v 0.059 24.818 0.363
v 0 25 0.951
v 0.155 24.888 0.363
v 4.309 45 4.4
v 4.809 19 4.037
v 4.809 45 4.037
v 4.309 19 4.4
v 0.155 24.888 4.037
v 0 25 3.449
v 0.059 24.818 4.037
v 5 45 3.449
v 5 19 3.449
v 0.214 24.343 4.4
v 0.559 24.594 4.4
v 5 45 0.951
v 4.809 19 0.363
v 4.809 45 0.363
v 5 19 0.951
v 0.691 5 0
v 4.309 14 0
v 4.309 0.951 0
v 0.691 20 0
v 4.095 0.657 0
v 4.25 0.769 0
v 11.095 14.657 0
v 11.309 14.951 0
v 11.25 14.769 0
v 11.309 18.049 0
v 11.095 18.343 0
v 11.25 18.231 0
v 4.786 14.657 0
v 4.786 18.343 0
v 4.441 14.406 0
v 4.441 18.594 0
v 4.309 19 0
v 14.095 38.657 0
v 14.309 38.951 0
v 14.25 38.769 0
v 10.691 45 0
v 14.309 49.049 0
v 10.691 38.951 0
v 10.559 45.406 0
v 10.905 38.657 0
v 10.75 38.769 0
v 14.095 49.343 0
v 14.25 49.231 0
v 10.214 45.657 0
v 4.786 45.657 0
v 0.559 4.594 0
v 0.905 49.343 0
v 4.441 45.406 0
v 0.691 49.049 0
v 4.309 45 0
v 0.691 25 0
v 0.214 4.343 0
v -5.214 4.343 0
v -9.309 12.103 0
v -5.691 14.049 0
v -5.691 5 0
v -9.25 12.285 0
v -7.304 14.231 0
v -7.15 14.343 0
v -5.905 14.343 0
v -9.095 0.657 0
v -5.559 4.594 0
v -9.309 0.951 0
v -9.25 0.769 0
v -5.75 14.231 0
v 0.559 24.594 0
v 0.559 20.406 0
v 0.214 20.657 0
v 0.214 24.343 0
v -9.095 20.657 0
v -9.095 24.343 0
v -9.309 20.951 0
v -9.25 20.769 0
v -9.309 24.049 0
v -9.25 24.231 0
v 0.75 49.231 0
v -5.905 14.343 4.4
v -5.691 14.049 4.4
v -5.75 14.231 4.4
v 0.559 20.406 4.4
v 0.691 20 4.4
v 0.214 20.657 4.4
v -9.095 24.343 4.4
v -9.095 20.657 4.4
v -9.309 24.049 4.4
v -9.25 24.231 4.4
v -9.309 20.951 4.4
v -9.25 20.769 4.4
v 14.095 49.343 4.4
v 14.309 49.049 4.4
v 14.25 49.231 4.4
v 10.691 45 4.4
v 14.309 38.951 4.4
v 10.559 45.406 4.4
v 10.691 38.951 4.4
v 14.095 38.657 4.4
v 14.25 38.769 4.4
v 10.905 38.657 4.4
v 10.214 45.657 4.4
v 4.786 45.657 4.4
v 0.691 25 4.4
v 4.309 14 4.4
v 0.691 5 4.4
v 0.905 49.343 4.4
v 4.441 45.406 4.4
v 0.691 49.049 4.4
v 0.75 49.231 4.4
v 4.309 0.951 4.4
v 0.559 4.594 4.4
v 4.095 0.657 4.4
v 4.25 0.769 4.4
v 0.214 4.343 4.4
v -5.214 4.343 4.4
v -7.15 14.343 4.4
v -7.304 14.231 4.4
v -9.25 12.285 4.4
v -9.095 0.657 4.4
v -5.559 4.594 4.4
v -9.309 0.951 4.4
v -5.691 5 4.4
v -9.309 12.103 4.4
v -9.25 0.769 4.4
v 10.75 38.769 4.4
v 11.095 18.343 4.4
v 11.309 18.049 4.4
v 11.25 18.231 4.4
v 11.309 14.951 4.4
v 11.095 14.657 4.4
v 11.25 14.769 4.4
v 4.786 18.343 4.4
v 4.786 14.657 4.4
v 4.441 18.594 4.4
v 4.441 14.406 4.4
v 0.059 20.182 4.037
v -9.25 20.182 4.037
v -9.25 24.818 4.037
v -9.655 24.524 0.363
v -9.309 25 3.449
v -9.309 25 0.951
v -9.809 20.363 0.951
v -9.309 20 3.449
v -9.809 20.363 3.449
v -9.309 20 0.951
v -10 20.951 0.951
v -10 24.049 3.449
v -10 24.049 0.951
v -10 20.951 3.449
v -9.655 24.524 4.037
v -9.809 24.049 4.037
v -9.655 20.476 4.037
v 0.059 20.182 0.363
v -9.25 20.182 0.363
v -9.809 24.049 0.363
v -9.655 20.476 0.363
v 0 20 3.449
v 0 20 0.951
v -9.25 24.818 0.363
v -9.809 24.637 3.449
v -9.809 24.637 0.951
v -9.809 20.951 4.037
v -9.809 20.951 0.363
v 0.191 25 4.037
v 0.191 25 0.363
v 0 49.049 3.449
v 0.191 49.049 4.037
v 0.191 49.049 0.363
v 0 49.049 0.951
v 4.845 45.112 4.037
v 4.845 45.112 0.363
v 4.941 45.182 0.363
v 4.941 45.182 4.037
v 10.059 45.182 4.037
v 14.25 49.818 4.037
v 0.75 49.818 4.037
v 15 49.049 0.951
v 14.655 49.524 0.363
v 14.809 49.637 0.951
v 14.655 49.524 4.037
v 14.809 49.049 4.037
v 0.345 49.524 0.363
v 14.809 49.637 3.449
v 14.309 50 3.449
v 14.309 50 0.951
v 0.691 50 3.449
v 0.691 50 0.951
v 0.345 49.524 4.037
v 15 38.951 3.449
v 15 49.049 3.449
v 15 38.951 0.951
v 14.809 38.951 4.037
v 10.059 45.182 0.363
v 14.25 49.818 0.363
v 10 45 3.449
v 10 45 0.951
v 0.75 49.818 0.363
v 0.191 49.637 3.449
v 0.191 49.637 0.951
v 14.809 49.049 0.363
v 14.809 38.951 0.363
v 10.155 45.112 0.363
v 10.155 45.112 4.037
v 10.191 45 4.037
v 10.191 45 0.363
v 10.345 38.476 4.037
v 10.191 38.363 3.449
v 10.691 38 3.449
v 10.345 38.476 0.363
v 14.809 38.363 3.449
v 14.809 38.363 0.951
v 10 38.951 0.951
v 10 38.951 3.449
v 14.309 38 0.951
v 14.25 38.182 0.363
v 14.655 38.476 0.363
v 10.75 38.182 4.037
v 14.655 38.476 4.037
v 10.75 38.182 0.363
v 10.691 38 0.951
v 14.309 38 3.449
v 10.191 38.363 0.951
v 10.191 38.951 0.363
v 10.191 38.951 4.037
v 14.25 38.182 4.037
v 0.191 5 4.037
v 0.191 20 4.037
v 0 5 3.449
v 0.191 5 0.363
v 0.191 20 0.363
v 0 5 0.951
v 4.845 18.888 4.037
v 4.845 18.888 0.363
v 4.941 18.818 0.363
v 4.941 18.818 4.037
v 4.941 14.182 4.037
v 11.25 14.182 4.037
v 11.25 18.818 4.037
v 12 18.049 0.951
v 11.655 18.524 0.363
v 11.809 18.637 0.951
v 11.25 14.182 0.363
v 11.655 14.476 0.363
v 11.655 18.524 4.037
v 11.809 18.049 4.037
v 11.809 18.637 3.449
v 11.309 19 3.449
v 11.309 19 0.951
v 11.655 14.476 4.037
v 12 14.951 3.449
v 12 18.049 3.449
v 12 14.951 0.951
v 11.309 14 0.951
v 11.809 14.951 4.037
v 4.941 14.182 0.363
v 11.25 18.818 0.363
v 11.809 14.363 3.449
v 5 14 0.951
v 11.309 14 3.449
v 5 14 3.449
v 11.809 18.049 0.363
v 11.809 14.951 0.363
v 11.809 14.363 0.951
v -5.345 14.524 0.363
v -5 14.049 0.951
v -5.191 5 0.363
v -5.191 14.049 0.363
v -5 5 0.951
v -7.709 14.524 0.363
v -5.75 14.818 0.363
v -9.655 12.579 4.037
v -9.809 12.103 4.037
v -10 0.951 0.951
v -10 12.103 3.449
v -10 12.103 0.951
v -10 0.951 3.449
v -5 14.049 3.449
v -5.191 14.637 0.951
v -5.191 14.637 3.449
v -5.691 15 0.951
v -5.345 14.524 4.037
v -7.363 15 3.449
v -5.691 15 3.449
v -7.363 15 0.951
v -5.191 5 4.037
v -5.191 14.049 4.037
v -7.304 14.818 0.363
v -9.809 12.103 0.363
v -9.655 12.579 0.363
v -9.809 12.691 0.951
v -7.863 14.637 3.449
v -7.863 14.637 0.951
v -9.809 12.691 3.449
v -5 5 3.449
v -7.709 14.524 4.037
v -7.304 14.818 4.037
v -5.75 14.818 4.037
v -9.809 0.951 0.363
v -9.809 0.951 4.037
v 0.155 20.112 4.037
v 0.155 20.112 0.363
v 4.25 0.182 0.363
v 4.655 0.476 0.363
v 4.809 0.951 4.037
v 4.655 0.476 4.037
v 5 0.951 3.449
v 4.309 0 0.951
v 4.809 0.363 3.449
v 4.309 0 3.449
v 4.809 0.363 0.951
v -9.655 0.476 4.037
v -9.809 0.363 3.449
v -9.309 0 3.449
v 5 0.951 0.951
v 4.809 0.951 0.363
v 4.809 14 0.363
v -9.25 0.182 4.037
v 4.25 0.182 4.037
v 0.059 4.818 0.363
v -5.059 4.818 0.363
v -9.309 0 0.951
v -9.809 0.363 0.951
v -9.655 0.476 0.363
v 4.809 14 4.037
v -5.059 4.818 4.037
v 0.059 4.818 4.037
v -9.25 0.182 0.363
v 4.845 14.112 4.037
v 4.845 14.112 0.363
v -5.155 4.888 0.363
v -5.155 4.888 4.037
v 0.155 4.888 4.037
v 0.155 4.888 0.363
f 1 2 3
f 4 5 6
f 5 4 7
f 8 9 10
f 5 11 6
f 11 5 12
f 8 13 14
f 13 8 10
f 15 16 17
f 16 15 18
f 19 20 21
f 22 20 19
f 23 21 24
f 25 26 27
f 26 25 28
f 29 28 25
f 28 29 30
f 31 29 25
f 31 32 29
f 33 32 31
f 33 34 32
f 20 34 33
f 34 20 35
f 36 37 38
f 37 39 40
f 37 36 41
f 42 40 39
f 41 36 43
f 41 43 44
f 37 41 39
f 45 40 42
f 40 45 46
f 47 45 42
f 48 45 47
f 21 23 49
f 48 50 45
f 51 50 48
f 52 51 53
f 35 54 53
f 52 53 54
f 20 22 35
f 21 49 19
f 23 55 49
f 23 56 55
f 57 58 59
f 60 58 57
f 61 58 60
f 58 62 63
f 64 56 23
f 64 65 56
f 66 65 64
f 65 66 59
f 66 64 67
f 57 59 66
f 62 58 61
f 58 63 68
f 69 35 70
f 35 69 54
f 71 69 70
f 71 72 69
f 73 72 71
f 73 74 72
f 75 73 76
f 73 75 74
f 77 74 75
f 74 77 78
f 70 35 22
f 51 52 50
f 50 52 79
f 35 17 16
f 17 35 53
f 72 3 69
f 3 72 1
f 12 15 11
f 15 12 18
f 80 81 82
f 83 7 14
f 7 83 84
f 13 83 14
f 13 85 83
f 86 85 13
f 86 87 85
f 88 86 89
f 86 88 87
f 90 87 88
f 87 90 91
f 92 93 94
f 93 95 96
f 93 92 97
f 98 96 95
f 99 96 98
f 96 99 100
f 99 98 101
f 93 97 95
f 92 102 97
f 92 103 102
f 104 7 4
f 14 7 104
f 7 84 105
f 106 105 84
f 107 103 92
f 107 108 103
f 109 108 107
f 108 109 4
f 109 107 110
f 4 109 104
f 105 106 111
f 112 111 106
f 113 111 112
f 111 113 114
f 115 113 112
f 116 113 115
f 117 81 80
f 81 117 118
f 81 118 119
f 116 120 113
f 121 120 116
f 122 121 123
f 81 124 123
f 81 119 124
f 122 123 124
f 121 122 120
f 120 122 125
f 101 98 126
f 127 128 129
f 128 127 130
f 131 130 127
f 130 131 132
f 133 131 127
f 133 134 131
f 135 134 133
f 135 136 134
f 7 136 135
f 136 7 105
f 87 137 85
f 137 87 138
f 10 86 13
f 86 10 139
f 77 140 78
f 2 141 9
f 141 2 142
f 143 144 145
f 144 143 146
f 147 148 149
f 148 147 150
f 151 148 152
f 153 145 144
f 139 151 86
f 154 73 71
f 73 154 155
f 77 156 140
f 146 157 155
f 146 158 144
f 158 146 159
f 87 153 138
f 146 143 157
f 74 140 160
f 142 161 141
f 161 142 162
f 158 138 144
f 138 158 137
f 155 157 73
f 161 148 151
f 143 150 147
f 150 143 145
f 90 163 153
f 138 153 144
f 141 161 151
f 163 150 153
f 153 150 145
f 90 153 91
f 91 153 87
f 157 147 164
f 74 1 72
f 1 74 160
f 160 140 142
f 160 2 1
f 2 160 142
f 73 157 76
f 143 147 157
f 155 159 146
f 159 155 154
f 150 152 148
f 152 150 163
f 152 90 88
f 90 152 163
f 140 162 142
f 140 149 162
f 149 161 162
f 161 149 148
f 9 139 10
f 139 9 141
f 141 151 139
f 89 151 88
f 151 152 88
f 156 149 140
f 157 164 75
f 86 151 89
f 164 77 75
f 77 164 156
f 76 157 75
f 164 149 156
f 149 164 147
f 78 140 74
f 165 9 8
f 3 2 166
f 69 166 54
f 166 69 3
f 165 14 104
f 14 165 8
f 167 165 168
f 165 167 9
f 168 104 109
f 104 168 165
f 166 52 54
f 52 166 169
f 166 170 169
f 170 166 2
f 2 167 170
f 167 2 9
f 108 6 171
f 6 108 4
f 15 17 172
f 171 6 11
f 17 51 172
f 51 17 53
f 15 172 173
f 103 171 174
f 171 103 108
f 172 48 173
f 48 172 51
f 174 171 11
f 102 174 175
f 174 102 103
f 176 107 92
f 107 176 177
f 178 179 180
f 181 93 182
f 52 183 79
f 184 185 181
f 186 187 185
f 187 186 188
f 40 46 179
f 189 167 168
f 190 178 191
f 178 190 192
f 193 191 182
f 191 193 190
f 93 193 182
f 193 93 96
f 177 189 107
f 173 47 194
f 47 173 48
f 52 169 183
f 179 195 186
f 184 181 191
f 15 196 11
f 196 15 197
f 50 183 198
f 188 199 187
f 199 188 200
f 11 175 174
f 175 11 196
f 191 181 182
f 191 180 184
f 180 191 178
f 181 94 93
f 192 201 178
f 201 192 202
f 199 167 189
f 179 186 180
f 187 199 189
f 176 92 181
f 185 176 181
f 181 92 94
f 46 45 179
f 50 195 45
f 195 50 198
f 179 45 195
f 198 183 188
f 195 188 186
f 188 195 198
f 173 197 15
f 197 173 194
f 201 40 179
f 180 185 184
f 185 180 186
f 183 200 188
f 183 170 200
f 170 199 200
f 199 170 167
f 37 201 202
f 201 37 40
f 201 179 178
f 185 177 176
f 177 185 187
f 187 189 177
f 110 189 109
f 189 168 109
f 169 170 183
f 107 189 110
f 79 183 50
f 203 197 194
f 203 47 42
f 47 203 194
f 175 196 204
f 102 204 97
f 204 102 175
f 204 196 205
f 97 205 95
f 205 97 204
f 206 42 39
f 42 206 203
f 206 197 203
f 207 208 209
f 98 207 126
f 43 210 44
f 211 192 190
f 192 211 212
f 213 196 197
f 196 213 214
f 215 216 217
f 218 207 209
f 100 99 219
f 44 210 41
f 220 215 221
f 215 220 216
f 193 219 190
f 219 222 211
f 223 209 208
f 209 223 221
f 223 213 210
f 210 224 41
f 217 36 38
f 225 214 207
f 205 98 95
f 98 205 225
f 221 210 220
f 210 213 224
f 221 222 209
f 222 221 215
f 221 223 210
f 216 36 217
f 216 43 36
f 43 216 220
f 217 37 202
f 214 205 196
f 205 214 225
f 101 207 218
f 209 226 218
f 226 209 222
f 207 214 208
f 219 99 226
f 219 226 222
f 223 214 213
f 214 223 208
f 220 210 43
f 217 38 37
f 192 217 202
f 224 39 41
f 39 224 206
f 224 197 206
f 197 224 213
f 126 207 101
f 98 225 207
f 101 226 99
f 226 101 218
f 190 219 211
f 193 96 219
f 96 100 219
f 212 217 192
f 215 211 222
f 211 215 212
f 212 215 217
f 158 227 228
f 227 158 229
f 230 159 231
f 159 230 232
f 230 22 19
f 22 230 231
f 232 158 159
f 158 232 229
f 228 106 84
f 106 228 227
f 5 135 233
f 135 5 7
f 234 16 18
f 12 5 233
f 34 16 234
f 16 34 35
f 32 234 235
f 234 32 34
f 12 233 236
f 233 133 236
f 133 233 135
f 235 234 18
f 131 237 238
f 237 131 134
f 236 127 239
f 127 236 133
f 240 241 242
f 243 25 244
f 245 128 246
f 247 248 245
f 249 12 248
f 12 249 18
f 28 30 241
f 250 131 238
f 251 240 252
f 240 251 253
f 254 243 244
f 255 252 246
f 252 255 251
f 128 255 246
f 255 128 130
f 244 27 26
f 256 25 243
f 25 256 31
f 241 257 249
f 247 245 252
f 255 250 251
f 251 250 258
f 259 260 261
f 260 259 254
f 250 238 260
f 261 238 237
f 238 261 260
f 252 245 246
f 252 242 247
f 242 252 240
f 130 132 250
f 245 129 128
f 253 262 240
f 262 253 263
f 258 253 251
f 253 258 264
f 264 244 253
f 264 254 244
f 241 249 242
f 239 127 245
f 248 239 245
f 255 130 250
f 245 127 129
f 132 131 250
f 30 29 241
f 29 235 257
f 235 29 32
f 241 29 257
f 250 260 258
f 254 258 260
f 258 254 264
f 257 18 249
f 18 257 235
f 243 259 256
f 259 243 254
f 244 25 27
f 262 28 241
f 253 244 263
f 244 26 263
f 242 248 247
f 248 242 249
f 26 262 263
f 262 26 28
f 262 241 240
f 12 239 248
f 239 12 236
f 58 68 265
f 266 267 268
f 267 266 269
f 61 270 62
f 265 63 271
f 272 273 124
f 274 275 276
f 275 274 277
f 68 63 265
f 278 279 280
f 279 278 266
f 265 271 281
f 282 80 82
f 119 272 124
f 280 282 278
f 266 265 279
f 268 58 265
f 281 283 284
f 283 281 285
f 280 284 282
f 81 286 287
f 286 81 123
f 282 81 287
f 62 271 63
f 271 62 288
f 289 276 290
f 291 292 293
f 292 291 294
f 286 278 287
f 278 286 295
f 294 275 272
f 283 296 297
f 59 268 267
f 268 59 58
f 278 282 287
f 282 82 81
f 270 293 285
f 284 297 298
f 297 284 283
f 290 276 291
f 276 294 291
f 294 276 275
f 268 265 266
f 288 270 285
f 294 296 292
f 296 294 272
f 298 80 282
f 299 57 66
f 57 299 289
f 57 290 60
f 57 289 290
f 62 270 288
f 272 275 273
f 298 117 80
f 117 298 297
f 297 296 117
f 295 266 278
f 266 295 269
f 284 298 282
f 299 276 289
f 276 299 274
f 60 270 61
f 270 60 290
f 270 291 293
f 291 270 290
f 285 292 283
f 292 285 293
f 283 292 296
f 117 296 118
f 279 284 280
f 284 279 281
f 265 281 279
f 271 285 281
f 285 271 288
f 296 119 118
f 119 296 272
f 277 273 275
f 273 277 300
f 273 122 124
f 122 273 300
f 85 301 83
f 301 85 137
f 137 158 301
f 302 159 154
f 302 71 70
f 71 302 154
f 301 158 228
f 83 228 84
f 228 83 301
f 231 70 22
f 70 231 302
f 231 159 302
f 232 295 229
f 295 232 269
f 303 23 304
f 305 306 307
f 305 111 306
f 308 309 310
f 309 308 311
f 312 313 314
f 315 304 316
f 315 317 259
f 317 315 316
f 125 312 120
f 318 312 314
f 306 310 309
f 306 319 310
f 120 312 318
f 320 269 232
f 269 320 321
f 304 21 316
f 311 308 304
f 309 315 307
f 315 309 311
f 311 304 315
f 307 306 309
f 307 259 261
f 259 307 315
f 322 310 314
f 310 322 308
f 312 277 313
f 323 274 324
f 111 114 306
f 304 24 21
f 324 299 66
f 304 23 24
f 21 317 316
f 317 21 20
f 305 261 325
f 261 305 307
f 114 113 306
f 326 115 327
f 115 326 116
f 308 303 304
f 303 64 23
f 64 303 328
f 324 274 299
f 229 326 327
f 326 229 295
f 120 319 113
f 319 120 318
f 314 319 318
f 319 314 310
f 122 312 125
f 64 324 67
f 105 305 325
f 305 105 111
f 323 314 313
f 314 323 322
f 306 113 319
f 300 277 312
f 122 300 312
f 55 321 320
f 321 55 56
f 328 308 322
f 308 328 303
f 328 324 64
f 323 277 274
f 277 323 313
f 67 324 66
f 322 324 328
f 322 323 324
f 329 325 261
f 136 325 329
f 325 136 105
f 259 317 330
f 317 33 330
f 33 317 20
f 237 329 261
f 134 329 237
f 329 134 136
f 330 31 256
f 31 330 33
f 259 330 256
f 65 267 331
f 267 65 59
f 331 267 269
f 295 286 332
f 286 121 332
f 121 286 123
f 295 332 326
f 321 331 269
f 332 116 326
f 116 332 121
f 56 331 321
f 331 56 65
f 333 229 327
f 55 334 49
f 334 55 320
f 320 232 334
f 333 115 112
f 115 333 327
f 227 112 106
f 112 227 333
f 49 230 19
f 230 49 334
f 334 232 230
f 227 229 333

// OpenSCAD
/* [Hidden] */
$fn = 10;

CLIP_HEIGHT = 12;
CLIP_PIN_INNER_DISTANCE = 26;
PIN_LENGTH = 7;

BASE_WIDTH = 4.4;
BASE_DEPTH = 5;

/* [Base] */
// Height of the base.
BASE_HEIGHT = 50; // [36:100]

/* [Hook] */
// Enable Smooth Edges.
ENABLE_SMOOTH_EDGES = true;
// Make the hook a bit prettier.
ENABLE_HOOK_NICE = true;
// Length (horizontal size) of the hook.
HOOK_SIZE_H = 15; // [1:100]
// Height (vertical size) of the hook.
HOOK_SIZE_V = 10; // [0:50]
// Vertical rotation of the hook.
HOOK_ROTATION = 0; // [0:90]


minkowskiOutsideRound(1, ENABLE_SMOOTH_EDGES) {
	hook(
		base_height = BASE_HEIGHT,
		base_width = BASE_WIDTH,
		base_depth = BASE_DEPTH,
		clip_height = CLIP_HEIGHT,
		clip_pin_distance = CLIP_PIN_INNER_DISTANCE,
		pin_length = PIN_LENGTH,
		hook_size_h = HOOK_SIZE_H,
		hook_size_v = HOOK_SIZE_V,
		hook_nice = ENABLE_HOOK_NICE,
		hook_rotation = HOOK_ROTATION
	);
}


module hook(
	base_height = 50,
	base_width = 4.4,
	base_depth = 5,
	clip_height = 12,
	clip_pin_distance = 19,
	pin_length = 7,
	hook_size_h = 15,
	hook_size_v = 5,
	hook_nice = true,
	hook_rotation = 0,
) {
	// Base
	cube(size=[base_depth, base_height, base_width]);

	// Clip, Top
	translate([base_depth, base_height-base_depth, 0]) {
		cube(size=[base_depth, base_depth, base_width]);
	}

	// Clip, Back
	translate([base_depth*2, base_height-clip_height, 0]) {
		cube(size=[base_depth, clip_height, base_width]);
	}

	// Pin
	translate([base_depth, base_height-2*base_depth-clip_pin_distance, 0]) {
		cube(size=[7, base_depth, base_width]);
	}

	// Hook, Horizontal
	translate([-(hook_size_h-base_depth), 0, 0]) {
		cube(size=[hook_size_h-base_depth, base_depth, base_width]);
	}
	
	// Adding new Hooks
	// Hook, Horizontal 2
	translate([-(hook_size_h-base_depth), 20, 0]) {
		cube(size=[hook_size_h-base_depth, base_depth, base_width]);
	}

	// Hook, Vertical
	if (hook_size_h > 0) {
		translate([-(hook_size_h-base_depth), 0, 0]) {
			rotate([0, 0, hook_rotation]) {
				difference() {
					cube(size=[base_depth, base_depth+hook_size_v, base_width]);
					
					if (hook_nice == true) {
						translate([0, hook_size_v+base_depth/2, -1]) {
							rotate([0, 0, 45]) {
							cube(size=[base_depth, base_depth, base_width+2]);
							}
						}
					}
				}
			}
		}
	}
}

// Library: MinkowskiRound.scad
// Version: 1.0
// Author: IrevDev
// Copyright: 2017
// License: LGPL 2.1 or later
// Url: https://github.com/Irev-Dev/Round-Anything

module minkowskiOutsideRound(r=1,enable=true,cubeSize=[500,500,500]){
    if(enable==false){//do nothing if not enabled
        children();
    } else {
        minkowski(){//expand the now positive shape
            difference(){//make the negative positive
                cube(cubeSize-[0.1,0.1,0.1],center=true);
                minkowski(){//expand the negative inwards
                    difference(){//create a negative of the children
                        cube(cubeSize,center=true);
                        children();
                    }
                    sphere(r);
                }
            }
            sphere(r);
        }
    }
}
